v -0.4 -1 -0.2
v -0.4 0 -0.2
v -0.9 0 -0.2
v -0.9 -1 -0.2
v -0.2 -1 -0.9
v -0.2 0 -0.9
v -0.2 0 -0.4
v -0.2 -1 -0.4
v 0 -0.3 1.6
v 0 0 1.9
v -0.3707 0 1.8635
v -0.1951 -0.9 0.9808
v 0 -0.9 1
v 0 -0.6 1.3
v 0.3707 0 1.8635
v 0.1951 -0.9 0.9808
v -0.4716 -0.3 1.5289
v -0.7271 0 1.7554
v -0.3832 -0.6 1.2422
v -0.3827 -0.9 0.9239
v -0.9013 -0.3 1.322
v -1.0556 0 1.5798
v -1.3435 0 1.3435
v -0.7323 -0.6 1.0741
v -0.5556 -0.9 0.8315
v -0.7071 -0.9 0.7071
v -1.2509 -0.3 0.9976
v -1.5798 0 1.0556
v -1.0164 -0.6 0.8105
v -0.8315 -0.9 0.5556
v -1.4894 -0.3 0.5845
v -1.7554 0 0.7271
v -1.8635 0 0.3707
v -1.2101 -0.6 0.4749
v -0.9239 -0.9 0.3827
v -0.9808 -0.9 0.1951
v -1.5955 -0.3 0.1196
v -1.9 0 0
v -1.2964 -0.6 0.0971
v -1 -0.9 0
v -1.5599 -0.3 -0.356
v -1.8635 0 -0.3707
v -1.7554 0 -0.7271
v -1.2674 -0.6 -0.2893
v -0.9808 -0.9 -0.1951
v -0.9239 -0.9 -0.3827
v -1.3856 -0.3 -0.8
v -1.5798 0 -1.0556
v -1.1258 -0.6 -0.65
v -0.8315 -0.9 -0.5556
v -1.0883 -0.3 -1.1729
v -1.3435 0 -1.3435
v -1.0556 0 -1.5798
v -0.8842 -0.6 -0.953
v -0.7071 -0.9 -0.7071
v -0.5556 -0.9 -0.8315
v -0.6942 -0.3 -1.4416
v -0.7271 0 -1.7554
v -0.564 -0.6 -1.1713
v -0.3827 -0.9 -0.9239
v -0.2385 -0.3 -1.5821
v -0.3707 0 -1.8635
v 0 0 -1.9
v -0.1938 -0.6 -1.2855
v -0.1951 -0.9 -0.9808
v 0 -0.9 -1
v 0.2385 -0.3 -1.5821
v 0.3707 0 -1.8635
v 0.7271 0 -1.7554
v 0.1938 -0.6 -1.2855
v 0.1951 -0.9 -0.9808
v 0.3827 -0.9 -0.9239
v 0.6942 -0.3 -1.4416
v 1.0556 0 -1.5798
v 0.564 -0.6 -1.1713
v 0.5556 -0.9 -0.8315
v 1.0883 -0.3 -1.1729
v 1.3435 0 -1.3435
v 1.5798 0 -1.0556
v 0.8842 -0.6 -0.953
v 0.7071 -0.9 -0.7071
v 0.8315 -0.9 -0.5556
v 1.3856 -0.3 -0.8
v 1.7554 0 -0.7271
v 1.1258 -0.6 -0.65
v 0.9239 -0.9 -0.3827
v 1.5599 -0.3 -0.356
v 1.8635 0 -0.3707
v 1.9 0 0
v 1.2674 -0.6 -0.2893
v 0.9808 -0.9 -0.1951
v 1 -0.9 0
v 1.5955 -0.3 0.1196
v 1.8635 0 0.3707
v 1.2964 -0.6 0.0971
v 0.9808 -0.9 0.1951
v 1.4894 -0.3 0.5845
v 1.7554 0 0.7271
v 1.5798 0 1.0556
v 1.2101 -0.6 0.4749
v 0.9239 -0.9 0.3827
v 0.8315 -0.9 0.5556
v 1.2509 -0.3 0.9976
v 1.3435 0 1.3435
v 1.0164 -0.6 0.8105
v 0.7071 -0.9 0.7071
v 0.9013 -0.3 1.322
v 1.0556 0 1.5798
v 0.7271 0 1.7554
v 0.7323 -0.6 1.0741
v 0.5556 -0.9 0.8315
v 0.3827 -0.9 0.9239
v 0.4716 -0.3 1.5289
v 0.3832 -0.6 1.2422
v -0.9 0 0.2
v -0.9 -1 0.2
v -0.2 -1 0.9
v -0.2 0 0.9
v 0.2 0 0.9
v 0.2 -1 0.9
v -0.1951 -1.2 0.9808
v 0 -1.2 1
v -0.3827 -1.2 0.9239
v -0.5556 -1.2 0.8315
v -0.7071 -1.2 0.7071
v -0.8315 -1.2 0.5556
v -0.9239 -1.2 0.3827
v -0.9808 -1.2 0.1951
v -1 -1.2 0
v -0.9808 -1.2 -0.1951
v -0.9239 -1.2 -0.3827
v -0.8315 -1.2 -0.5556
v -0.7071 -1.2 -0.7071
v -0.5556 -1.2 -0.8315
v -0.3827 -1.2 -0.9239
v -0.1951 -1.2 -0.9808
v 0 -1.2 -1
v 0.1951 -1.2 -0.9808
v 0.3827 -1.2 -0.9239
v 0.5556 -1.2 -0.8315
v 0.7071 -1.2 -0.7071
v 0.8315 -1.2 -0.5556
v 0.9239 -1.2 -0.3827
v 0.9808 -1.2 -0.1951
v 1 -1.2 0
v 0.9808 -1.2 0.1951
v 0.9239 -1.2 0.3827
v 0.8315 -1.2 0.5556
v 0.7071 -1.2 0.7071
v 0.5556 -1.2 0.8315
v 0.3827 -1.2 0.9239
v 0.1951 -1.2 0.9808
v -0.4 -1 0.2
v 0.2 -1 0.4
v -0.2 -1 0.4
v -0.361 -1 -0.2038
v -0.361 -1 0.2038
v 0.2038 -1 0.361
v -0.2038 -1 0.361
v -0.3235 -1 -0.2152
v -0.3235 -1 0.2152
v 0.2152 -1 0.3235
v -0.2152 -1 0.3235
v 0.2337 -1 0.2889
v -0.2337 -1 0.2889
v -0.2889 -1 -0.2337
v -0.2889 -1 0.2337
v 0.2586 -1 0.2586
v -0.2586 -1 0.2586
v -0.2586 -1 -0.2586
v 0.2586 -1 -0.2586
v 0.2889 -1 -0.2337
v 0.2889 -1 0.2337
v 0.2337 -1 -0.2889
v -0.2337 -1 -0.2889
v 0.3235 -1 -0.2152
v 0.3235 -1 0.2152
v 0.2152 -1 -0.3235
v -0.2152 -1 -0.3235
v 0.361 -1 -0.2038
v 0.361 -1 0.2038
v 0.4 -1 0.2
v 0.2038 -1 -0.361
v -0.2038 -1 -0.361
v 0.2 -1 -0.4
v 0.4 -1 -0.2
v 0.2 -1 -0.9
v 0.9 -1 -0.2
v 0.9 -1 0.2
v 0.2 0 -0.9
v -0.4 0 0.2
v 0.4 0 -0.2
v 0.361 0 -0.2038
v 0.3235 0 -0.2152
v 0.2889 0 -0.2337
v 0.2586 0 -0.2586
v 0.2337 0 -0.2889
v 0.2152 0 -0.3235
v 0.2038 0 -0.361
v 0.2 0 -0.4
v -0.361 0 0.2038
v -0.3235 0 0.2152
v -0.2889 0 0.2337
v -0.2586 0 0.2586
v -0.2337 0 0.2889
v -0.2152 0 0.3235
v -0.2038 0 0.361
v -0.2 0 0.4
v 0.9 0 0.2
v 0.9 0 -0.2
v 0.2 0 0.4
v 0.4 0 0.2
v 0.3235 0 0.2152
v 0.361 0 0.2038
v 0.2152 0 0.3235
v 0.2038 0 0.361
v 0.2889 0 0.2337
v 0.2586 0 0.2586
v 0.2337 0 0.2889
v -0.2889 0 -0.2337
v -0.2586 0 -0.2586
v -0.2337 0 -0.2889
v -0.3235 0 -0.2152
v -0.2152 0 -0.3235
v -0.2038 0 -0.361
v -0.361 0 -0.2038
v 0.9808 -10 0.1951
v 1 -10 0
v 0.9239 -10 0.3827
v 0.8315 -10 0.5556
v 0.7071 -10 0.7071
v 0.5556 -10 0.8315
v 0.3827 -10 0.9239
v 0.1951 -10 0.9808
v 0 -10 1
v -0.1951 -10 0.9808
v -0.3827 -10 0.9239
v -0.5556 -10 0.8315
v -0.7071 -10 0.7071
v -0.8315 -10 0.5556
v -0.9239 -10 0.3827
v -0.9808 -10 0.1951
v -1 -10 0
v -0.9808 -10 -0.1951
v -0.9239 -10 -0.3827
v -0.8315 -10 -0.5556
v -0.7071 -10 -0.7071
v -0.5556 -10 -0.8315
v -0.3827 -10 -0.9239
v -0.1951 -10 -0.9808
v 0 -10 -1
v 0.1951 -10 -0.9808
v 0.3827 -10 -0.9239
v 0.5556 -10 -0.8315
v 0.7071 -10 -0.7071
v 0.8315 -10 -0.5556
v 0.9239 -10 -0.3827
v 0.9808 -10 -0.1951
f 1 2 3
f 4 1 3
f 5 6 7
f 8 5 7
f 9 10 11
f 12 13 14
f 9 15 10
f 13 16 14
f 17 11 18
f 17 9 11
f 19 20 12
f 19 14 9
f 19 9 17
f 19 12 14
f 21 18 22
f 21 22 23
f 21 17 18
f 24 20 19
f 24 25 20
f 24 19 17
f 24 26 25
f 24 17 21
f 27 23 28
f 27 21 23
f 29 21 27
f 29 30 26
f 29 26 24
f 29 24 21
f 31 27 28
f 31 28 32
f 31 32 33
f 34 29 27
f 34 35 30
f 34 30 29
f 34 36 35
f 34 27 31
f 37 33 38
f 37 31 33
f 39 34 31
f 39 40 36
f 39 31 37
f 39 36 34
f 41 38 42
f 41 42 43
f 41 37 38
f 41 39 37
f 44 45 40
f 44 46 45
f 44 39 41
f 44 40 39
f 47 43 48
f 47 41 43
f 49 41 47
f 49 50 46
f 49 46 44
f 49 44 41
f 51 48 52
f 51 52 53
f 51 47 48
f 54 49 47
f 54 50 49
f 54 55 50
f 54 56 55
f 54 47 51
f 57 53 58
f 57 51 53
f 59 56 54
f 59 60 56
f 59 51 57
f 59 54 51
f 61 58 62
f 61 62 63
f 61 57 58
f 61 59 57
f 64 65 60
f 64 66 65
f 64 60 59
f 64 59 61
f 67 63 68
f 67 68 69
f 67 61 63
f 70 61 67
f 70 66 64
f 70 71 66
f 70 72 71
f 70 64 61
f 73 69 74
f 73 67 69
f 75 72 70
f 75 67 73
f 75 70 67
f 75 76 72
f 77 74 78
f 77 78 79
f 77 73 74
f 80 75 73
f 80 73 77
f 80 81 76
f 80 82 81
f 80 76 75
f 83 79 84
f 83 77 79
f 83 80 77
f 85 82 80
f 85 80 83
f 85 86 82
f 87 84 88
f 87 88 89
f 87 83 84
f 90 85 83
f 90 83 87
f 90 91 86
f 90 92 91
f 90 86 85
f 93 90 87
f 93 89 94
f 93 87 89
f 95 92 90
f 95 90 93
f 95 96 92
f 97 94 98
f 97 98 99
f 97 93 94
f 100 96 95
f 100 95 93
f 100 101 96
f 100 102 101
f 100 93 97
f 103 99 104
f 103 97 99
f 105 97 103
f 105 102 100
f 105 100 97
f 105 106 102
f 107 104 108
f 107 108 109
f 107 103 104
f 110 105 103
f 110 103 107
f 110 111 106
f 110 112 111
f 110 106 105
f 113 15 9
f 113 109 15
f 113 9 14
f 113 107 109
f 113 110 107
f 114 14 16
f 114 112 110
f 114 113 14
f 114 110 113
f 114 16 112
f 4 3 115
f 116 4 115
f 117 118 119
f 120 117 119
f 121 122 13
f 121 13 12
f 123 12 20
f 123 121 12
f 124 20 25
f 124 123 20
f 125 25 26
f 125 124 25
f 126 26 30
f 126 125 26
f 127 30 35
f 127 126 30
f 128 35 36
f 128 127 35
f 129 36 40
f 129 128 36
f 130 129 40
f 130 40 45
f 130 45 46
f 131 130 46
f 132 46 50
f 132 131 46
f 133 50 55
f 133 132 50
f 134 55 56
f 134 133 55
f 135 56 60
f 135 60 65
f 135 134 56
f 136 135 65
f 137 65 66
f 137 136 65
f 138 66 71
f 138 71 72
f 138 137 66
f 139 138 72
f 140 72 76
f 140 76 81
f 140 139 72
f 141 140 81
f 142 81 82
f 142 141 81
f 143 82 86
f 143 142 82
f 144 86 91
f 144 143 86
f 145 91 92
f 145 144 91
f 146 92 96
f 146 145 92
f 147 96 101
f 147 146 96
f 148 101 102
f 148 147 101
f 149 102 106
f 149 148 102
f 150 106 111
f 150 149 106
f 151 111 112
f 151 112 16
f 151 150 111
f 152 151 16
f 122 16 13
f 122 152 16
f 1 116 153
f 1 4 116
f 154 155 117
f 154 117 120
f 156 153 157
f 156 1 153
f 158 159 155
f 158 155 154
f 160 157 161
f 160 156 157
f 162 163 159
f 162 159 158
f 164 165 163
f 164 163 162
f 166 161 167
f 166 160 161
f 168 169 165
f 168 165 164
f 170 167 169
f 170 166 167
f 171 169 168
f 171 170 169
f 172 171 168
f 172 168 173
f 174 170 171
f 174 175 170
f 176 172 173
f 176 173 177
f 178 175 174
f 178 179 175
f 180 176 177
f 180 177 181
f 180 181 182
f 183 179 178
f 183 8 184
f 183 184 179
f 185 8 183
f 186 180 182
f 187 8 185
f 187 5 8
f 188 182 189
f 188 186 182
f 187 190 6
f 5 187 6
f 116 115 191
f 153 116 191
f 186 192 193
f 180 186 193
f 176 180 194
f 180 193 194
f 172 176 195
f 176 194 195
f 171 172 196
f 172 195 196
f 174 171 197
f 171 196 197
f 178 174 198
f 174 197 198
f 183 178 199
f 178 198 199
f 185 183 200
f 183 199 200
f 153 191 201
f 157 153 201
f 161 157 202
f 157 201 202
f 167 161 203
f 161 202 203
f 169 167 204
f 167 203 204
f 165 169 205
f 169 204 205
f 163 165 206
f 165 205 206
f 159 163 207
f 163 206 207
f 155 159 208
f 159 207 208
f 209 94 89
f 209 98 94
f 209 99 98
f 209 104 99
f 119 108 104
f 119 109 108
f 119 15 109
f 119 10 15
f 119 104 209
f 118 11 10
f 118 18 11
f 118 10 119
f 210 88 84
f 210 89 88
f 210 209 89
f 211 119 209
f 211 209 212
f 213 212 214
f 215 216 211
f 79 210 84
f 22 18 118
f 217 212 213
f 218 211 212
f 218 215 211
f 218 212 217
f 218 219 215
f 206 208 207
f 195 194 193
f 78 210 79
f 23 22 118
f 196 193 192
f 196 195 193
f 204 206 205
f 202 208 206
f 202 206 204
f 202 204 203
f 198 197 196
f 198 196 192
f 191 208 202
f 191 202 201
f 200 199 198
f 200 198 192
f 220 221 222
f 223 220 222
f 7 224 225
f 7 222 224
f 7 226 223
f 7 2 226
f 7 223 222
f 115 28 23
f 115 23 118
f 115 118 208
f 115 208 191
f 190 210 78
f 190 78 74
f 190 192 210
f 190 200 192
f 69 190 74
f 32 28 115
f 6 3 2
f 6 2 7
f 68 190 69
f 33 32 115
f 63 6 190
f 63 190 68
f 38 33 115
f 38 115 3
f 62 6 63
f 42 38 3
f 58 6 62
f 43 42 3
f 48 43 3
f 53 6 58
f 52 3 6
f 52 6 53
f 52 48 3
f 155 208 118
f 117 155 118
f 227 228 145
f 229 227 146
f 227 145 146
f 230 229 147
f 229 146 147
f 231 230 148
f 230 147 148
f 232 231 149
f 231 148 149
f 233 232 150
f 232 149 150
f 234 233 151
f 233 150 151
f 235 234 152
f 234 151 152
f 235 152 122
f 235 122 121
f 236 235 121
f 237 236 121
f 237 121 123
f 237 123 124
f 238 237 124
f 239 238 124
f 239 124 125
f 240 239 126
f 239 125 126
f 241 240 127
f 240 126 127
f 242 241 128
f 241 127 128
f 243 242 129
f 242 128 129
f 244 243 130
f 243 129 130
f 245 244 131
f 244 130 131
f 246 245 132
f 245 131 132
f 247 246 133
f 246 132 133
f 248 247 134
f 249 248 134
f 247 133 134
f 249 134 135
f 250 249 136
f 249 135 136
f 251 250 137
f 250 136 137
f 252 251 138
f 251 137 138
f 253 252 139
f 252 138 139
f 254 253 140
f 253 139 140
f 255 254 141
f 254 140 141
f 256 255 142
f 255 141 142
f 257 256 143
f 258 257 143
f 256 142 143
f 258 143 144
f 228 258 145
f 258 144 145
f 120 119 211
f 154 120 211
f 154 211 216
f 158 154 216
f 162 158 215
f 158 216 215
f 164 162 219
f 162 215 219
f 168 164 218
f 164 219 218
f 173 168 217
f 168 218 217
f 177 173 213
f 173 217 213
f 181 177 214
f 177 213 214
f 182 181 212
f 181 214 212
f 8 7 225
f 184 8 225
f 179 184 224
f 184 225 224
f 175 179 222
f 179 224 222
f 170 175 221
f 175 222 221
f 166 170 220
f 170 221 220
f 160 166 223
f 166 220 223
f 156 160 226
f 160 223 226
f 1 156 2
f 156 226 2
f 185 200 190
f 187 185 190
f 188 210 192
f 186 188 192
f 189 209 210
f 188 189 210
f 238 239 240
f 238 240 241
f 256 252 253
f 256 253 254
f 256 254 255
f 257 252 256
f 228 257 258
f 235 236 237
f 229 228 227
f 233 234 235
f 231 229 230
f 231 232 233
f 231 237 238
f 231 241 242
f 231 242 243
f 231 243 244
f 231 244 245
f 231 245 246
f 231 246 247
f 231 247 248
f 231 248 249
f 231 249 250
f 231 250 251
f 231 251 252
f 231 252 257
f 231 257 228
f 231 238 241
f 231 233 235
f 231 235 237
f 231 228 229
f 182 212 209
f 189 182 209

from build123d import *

# Parameters (mm, degrees)
SKETCH2_R           = 1
BOSS_EXTRUDE1_DEPTH = 8.8
CUT_EXTRUDE1_DEPTH  = 1


with BuildPart() as part:
    # Sketch1 → Revolve1 (revolve)
    with BuildSketch(Plane(origin=(0, 0, 0), x_dir=(0, 0, -1), z_dir=(1, 0, 0))):
        Polygon((0, 0), (-1.9, 0), (-1, -0.9), (-1, -1.2), (0, -1.2), align=None)
    revolve(axis=Axis((0, 0.872326939, 0), (0, -1, 0)))

    # Sketch2 → Boss-Extrude1 (add)
    with BuildSketch(Plane.XZ.offset(1.2)):
        Circle(SKETCH2_R)
    extrude(amount=BOSS_EXTRUDE1_DEPTH)

    # Sketch3 → Cut-Extrude1 (cut)
    with BuildSketch(Plane(origin=(0, 0, 0), x_dir=(1, 0, 0), z_dir=(0, 1, 0))):
        with BuildLine():
            Line((-0.9, -0.2), (-0.4, -0.2))
            ThreePointArc((-0.4, -0.2), (-0.258578644, -0.258578644), (-0.2, -0.4))
            Line((-0.2, -0.4), (-0.2, -0.9))
            Line((-0.2, -0.9), (0.2, -0.9))
            Line((0.2, -0.9), (0.2, -0.4))
            ThreePointArc((0.2, -0.4), (0.258578644, -0.258578644), (0.4, -0.2))
            Line((0.4, -0.2), (0.9, -0.2))
            Line((0.9, -0.2), (0.9, 0.2))
            Line((0.9, 0.2), (0.4, 0.2))
            ThreePointArc((0.4, 0.2), (0.258578644, 0.258578644), (0.2, 0.4))
            Line((0.2, 0.4), (0.2, 0.9))
            Line((0.2, 0.9), (-0.2, 0.9))
            Line((-0.2, 0.9), (-0.2, 0.4))
            ThreePointArc((-0.2, 0.4), (-0.258578644, 0.258578644), (-0.4, 0.2))
            Line((-0.4, 0.2), (-0.9, 0.2))
            Line((-0.9, 0.2), (-0.9, -0.2))
        make_face()
    extrude(amount=-CUT_EXTRUDE1_DEPTH, mode=Mode.SUBTRACT)


solid = part.part
